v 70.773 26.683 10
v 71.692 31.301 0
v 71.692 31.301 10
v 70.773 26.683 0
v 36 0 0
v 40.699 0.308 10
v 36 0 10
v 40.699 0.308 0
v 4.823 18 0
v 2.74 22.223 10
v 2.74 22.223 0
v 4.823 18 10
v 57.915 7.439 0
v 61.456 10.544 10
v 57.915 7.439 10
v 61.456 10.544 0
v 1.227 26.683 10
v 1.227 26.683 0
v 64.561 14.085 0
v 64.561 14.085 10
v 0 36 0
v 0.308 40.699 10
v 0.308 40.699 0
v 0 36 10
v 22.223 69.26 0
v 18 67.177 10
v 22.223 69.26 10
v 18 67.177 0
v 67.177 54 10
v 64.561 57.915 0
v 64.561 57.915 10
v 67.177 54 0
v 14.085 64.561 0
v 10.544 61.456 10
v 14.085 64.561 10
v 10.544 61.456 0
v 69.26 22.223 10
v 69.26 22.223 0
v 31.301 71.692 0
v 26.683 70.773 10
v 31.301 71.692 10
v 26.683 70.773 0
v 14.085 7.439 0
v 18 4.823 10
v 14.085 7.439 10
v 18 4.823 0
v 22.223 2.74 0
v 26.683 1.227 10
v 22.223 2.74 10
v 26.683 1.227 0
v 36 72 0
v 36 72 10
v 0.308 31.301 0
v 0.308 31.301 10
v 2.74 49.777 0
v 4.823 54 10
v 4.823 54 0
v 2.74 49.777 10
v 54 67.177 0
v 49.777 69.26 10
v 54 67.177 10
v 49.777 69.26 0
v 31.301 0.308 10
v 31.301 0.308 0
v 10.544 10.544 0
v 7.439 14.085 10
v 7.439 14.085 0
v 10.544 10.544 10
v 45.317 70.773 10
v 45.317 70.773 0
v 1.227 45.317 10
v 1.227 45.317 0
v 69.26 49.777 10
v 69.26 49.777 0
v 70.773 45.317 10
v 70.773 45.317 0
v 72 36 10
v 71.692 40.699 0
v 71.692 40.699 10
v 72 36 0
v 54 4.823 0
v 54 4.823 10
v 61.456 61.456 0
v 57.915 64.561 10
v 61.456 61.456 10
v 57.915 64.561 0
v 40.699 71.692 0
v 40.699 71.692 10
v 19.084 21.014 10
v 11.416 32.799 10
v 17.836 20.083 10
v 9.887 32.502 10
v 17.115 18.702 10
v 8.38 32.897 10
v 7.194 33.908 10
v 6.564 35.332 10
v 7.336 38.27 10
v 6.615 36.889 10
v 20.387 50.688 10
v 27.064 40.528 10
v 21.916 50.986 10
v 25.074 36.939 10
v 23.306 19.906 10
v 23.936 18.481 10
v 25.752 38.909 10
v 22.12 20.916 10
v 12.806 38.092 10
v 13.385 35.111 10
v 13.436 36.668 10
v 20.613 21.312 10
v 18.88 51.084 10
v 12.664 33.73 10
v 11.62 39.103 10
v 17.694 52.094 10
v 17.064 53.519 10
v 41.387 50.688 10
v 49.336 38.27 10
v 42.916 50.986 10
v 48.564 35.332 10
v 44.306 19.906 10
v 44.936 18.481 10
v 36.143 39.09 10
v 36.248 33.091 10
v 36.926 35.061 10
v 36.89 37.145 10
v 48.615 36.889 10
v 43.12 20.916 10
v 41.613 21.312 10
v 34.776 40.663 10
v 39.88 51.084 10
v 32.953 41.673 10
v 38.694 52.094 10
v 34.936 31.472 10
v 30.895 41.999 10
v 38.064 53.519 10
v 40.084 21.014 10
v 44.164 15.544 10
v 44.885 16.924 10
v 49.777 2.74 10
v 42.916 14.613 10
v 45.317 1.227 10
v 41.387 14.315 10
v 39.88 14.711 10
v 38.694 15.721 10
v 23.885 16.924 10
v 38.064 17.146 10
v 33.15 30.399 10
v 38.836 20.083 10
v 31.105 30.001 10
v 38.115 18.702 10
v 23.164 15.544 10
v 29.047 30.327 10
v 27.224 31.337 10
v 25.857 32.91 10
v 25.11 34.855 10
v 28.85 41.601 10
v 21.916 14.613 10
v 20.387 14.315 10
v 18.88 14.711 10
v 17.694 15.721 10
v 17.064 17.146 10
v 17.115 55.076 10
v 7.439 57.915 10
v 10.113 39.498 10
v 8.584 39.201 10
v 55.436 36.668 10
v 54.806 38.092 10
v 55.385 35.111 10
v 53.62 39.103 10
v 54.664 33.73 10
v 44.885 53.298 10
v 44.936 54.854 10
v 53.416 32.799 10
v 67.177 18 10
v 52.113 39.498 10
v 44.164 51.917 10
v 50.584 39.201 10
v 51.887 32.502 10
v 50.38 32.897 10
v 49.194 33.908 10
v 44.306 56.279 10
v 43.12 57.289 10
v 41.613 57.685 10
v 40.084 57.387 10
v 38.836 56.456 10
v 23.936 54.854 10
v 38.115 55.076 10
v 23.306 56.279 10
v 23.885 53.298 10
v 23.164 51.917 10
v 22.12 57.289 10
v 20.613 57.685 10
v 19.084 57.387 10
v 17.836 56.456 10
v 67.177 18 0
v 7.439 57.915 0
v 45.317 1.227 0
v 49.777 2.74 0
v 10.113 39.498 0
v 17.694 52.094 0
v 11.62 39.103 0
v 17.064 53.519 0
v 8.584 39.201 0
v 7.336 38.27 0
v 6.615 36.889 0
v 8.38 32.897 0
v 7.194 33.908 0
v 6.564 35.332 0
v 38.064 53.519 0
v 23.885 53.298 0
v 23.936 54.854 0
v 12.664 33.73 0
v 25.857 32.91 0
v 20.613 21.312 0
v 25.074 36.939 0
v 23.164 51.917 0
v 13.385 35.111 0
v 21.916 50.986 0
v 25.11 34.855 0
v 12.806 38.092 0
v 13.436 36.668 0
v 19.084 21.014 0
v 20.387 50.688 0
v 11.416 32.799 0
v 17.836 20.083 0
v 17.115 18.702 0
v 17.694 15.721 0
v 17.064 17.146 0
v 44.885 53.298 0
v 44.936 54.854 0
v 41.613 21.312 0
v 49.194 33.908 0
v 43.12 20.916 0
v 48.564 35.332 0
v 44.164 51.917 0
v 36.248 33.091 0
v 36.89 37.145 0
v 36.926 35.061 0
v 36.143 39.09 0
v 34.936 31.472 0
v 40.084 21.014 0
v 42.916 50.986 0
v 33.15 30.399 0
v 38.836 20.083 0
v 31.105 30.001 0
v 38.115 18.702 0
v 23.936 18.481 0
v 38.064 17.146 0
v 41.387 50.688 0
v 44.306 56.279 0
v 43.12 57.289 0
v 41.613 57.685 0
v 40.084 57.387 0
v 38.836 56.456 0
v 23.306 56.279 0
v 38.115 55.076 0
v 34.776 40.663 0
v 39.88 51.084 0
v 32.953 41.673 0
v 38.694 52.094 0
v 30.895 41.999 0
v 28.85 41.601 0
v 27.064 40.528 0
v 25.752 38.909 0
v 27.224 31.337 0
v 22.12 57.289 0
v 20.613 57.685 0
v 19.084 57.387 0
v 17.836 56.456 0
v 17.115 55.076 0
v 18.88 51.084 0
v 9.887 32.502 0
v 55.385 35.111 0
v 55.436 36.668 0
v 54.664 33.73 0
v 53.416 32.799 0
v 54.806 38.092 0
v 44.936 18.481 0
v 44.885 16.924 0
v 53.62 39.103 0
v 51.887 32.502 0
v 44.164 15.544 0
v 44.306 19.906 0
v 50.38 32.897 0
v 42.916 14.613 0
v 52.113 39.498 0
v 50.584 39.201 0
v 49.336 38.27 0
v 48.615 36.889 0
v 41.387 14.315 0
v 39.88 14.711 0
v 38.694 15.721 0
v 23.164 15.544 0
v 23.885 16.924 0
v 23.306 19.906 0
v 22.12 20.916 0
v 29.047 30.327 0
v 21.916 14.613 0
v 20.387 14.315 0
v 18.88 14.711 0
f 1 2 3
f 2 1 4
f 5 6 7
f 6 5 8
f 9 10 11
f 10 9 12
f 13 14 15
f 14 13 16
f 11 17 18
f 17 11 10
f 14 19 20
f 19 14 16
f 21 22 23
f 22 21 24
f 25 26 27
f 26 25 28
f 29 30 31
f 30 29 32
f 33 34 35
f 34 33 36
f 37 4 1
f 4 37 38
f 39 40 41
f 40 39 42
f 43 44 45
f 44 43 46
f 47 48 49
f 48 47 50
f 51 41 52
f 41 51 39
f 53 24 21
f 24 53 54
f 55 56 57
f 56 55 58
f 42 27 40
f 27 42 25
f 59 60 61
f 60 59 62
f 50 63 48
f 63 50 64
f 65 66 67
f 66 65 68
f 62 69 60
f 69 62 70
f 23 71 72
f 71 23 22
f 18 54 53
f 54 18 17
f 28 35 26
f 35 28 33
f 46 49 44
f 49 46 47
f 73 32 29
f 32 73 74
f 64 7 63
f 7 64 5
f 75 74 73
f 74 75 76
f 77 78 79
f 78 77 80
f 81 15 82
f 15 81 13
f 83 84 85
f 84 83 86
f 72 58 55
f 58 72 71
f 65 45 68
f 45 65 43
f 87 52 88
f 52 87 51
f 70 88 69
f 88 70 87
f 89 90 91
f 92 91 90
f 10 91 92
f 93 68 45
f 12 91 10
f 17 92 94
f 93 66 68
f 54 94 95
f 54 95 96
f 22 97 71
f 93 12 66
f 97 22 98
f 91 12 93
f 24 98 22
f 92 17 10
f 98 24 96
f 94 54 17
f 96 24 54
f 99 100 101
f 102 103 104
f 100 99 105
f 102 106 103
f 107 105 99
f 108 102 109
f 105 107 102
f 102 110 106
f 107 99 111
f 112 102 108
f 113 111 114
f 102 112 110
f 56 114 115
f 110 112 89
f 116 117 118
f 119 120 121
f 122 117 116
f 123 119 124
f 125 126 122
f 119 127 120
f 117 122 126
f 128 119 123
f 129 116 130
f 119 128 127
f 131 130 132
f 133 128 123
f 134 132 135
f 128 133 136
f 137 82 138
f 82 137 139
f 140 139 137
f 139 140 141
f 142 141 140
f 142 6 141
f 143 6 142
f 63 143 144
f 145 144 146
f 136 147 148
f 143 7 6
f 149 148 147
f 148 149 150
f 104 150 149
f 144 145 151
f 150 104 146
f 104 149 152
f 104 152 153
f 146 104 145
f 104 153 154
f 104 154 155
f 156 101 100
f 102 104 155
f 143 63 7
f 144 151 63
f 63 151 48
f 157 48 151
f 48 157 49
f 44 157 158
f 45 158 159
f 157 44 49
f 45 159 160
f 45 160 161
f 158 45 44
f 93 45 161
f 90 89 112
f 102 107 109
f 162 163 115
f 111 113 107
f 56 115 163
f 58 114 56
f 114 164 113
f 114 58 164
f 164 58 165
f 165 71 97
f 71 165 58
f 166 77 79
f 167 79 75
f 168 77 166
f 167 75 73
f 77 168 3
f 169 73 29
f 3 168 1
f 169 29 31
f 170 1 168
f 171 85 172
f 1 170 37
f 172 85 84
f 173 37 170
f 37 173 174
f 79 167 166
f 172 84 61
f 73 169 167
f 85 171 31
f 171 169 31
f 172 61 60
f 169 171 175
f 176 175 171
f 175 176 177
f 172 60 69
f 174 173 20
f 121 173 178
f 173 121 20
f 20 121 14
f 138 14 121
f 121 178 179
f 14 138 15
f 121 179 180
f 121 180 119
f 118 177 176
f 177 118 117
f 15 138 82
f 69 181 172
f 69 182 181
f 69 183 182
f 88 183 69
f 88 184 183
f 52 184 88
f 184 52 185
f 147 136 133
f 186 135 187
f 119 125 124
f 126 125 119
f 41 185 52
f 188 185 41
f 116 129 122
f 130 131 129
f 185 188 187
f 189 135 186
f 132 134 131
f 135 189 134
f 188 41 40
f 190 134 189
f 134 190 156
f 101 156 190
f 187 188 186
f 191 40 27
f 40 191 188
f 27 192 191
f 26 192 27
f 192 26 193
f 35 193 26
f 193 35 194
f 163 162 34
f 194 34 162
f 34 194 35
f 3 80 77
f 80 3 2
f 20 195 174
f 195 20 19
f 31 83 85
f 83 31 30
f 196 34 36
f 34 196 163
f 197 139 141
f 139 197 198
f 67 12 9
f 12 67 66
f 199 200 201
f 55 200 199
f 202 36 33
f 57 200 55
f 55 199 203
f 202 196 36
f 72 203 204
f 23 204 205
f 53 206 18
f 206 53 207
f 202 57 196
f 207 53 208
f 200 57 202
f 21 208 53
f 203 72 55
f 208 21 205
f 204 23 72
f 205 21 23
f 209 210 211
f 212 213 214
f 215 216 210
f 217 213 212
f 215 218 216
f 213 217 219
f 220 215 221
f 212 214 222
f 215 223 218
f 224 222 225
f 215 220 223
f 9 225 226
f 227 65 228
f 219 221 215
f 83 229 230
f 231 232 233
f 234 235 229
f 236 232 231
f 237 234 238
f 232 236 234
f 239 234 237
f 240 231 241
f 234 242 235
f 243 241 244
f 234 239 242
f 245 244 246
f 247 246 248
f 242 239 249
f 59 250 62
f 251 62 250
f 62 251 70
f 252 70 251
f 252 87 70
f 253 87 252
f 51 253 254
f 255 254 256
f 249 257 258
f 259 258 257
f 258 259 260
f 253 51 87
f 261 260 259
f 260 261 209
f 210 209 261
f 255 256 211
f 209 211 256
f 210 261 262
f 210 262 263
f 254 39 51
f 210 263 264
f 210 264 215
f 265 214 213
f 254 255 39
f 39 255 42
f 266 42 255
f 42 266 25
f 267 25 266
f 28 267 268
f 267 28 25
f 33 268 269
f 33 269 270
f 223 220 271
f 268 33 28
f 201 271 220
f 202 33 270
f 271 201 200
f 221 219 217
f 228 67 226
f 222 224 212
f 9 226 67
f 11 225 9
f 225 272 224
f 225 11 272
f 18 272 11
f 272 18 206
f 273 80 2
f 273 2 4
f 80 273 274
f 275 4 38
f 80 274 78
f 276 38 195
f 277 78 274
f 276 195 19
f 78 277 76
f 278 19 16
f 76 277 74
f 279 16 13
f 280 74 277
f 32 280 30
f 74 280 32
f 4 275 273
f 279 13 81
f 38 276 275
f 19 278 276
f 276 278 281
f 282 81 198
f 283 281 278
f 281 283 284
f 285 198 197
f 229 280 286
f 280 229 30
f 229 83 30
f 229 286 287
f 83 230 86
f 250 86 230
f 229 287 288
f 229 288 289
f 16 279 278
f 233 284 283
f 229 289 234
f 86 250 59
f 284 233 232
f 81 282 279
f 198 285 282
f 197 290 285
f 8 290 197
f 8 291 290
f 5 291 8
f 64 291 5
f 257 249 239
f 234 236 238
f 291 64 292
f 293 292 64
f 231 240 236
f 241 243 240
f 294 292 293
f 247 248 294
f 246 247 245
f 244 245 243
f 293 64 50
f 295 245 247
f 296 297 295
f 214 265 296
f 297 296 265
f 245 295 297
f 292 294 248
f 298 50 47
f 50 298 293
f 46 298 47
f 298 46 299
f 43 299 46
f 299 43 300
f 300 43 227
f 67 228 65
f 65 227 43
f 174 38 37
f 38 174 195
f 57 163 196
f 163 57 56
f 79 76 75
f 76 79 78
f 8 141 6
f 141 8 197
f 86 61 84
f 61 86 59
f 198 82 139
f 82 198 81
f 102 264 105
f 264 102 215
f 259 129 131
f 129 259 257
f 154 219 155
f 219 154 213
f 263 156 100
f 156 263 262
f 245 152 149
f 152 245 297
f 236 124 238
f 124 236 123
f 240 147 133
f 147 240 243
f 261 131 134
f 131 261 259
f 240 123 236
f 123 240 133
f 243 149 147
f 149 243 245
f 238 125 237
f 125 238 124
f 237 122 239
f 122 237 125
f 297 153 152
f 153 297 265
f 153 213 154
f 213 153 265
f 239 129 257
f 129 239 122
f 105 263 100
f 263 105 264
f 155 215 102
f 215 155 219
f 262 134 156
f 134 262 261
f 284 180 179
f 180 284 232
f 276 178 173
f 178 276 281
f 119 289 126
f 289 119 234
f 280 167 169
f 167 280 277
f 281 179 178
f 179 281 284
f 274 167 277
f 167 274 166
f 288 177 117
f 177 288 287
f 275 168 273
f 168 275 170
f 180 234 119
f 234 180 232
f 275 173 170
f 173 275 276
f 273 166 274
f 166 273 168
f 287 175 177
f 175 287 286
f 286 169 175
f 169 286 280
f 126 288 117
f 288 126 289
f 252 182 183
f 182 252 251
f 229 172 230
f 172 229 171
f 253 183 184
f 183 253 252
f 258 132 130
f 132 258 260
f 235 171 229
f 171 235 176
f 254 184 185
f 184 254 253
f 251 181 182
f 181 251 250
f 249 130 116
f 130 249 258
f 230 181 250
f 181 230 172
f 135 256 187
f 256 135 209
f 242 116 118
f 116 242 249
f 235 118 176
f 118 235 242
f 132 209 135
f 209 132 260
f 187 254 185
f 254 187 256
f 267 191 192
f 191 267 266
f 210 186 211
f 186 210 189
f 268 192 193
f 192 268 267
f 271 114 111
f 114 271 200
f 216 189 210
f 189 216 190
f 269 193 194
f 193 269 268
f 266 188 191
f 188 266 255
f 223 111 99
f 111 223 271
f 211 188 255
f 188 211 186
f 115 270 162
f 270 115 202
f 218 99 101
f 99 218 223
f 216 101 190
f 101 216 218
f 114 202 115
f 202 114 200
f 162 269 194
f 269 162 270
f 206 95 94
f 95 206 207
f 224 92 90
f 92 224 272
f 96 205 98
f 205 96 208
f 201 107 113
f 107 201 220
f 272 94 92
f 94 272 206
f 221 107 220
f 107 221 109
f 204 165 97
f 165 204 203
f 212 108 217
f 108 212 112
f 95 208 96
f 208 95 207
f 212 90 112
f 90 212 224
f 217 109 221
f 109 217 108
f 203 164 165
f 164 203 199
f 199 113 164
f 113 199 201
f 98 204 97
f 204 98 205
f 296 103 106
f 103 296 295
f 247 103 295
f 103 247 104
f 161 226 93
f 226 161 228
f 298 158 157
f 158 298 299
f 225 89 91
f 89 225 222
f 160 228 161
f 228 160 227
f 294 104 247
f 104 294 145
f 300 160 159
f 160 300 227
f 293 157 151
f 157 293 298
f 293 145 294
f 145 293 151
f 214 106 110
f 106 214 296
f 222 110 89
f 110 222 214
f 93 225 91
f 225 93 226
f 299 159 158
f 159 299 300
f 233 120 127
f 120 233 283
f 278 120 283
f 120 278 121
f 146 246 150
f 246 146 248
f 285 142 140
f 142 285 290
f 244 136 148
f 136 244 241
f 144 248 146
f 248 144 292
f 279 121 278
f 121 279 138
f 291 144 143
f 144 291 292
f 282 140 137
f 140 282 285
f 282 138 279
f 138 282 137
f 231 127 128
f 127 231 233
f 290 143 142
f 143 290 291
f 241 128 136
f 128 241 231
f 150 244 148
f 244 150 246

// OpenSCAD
$fn = 32;

// ----------------------------------------------------------------------
// Cam plate: eccentric cam, base R36
// ----------------------------------------------------------------------

// --- parameters (mm) ---
base_r = 36;              // base circle radius
lobe_h = 10;              // cam lobe rise
bore_r = 6;               // shaft bore radius
plate_t = 10;             // plate thickness, Z (extrusion height)
ecc = 5;                  // disc eccentricity
ring_r = 21;              // lightening ring radius
bolt_r = 3.5;             // lightening hole radius
fit_tol = 0.05;           // declared fit tolerance (prompt contract)
free_tol = 0.2;           // declared free tolerance (prompt contract)

profile = [[72, 36], [71.692, 40.699], [70.773, 45.317], [69.26, 49.777], [67.177, 54], [64.561, 57.915], [61.456, 61.456], [57.915, 64.561], [54, 67.177], [49.777, 69.26], [45.317, 70.773], [40.699, 71.692], [36, 72], [31.301, 71.692], [26.683, 70.773], [22.223, 69.26], [18, 67.177], [14.085, 64.561], [10.544, 61.456], [7.439, 57.915], [4.823, 54], [2.74, 49.777], [1.227, 45.317], [0.308, 40.699], [0, 36], [0.308, 31.301], [1.227, 26.683], [2.74, 22.223], [4.823, 18], [7.439, 14.085], [10.544, 10.544], [14.085, 7.439], [18, 4.823], [22.223, 2.74], [26.683, 1.227], [31.301, 0.308], [36, 0], [40.699, 0.308], [45.317, 1.227], [49.777, 2.74], [54, 4.823], [57.915, 7.439], [61.456, 10.544], [64.561, 14.085], [67.177, 18], [69.26, 22.223], [70.773, 26.683], [71.692, 31.301]];  // primary outline, 48 points, counter clockwise
void_1 = [[36.89, 37.145], [36.143, 39.09], [34.776, 40.663], [32.953, 41.673], [30.895, 41.999], [28.85, 41.601], [27.064, 40.528], [25.752, 38.909], [25.074, 36.939], [25.11, 34.855], [25.857, 32.91], [27.224, 31.337], [29.047, 30.327], [31.105, 30.001], [33.15, 30.399], [34.936, 31.472], [36.248, 33.091], [36.926, 35.061]];  // shaft bore, 18 points
void_2 = [[55.436, 36.668], [54.806, 38.092], [53.62, 39.103], [52.113, 39.498], [50.584, 39.201], [49.336, 38.27], [48.615, 36.889], [48.564, 35.332], [49.194, 33.908], [50.38, 32.897], [51.887, 32.502], [53.416, 32.799], [54.664, 33.73], [55.385, 35.111]];  // lightening hole 1, 14 points
void_3 = [[44.936, 54.854], [44.306, 56.279], [43.12, 57.289], [41.613, 57.685], [40.084, 57.387], [38.836, 56.456], [38.115, 55.076], [38.064, 53.519], [38.694, 52.094], [39.88, 51.084], [41.387, 50.688], [42.916, 50.986], [44.164, 51.917], [44.885, 53.298]];  // lightening hole 2, 14 points
void_4 = [[23.936, 54.854], [23.306, 56.279], [22.12, 57.289], [20.613, 57.685], [19.084, 57.387], [17.836, 56.456], [17.115, 55.076], [17.064, 53.519], [17.694, 52.094], [18.88, 51.084], [20.387, 50.688], [21.916, 50.986], [23.164, 51.917], [23.885, 53.298]];  // lightening hole 3, 14 points
void_5 = [[13.436, 36.668], [12.806, 38.092], [11.62, 39.103], [10.113, 39.498], [8.584, 39.201], [7.336, 38.27], [6.615, 36.889], [6.564, 35.332], [7.194, 33.908], [8.38, 32.897], [9.887, 32.502], [11.416, 32.799], [12.664, 33.73], [13.385, 35.111]];  // lightening hole 4, 14 points
void_6 = [[23.936, 18.481], [23.306, 19.906], [22.12, 20.916], [20.613, 21.312], [19.084, 21.014], [17.836, 20.083], [17.115, 18.702], [17.064, 17.146], [17.694, 15.721], [18.88, 14.711], [20.387, 14.315], [21.916, 14.613], [23.164, 15.544], [23.885, 16.924]];  // lightening hole 5, 14 points
void_7 = [[44.936, 18.481], [44.306, 19.906], [43.12, 20.916], [41.613, 21.312], [40.084, 21.014], [38.836, 20.083], [38.115, 18.702], [38.064, 17.146], [38.694, 15.721], [39.88, 14.711], [41.387, 14.315], [42.916, 14.613], [44.164, 15.544], [44.885, 16.924]];  // lightening hole 6, 14 points

// --- the one profile operation ---
difference() {
  linear_extrude(height = plate_t) polygon(points = profile);
  translate([0, 0, -1])
    linear_extrude(height = plate_t + 2) polygon(points = void_1);
  translate([0, 0, -1])
    linear_extrude(height = plate_t + 2) polygon(points = void_2);
  translate([0, 0, -1])
    linear_extrude(height = plate_t + 2) polygon(points = void_3);
  translate([0, 0, -1])
    linear_extrude(height = plate_t + 2) polygon(points = void_4);
  translate([0, 0, -1])
    linear_extrude(height = plate_t + 2) polygon(points = void_5);
  translate([0, 0, -1])
    linear_extrude(height = plate_t + 2) polygon(points = void_6);
  translate([0, 0, -1])
    linear_extrude(height = plate_t + 2) polygon(points = void_7);
}
